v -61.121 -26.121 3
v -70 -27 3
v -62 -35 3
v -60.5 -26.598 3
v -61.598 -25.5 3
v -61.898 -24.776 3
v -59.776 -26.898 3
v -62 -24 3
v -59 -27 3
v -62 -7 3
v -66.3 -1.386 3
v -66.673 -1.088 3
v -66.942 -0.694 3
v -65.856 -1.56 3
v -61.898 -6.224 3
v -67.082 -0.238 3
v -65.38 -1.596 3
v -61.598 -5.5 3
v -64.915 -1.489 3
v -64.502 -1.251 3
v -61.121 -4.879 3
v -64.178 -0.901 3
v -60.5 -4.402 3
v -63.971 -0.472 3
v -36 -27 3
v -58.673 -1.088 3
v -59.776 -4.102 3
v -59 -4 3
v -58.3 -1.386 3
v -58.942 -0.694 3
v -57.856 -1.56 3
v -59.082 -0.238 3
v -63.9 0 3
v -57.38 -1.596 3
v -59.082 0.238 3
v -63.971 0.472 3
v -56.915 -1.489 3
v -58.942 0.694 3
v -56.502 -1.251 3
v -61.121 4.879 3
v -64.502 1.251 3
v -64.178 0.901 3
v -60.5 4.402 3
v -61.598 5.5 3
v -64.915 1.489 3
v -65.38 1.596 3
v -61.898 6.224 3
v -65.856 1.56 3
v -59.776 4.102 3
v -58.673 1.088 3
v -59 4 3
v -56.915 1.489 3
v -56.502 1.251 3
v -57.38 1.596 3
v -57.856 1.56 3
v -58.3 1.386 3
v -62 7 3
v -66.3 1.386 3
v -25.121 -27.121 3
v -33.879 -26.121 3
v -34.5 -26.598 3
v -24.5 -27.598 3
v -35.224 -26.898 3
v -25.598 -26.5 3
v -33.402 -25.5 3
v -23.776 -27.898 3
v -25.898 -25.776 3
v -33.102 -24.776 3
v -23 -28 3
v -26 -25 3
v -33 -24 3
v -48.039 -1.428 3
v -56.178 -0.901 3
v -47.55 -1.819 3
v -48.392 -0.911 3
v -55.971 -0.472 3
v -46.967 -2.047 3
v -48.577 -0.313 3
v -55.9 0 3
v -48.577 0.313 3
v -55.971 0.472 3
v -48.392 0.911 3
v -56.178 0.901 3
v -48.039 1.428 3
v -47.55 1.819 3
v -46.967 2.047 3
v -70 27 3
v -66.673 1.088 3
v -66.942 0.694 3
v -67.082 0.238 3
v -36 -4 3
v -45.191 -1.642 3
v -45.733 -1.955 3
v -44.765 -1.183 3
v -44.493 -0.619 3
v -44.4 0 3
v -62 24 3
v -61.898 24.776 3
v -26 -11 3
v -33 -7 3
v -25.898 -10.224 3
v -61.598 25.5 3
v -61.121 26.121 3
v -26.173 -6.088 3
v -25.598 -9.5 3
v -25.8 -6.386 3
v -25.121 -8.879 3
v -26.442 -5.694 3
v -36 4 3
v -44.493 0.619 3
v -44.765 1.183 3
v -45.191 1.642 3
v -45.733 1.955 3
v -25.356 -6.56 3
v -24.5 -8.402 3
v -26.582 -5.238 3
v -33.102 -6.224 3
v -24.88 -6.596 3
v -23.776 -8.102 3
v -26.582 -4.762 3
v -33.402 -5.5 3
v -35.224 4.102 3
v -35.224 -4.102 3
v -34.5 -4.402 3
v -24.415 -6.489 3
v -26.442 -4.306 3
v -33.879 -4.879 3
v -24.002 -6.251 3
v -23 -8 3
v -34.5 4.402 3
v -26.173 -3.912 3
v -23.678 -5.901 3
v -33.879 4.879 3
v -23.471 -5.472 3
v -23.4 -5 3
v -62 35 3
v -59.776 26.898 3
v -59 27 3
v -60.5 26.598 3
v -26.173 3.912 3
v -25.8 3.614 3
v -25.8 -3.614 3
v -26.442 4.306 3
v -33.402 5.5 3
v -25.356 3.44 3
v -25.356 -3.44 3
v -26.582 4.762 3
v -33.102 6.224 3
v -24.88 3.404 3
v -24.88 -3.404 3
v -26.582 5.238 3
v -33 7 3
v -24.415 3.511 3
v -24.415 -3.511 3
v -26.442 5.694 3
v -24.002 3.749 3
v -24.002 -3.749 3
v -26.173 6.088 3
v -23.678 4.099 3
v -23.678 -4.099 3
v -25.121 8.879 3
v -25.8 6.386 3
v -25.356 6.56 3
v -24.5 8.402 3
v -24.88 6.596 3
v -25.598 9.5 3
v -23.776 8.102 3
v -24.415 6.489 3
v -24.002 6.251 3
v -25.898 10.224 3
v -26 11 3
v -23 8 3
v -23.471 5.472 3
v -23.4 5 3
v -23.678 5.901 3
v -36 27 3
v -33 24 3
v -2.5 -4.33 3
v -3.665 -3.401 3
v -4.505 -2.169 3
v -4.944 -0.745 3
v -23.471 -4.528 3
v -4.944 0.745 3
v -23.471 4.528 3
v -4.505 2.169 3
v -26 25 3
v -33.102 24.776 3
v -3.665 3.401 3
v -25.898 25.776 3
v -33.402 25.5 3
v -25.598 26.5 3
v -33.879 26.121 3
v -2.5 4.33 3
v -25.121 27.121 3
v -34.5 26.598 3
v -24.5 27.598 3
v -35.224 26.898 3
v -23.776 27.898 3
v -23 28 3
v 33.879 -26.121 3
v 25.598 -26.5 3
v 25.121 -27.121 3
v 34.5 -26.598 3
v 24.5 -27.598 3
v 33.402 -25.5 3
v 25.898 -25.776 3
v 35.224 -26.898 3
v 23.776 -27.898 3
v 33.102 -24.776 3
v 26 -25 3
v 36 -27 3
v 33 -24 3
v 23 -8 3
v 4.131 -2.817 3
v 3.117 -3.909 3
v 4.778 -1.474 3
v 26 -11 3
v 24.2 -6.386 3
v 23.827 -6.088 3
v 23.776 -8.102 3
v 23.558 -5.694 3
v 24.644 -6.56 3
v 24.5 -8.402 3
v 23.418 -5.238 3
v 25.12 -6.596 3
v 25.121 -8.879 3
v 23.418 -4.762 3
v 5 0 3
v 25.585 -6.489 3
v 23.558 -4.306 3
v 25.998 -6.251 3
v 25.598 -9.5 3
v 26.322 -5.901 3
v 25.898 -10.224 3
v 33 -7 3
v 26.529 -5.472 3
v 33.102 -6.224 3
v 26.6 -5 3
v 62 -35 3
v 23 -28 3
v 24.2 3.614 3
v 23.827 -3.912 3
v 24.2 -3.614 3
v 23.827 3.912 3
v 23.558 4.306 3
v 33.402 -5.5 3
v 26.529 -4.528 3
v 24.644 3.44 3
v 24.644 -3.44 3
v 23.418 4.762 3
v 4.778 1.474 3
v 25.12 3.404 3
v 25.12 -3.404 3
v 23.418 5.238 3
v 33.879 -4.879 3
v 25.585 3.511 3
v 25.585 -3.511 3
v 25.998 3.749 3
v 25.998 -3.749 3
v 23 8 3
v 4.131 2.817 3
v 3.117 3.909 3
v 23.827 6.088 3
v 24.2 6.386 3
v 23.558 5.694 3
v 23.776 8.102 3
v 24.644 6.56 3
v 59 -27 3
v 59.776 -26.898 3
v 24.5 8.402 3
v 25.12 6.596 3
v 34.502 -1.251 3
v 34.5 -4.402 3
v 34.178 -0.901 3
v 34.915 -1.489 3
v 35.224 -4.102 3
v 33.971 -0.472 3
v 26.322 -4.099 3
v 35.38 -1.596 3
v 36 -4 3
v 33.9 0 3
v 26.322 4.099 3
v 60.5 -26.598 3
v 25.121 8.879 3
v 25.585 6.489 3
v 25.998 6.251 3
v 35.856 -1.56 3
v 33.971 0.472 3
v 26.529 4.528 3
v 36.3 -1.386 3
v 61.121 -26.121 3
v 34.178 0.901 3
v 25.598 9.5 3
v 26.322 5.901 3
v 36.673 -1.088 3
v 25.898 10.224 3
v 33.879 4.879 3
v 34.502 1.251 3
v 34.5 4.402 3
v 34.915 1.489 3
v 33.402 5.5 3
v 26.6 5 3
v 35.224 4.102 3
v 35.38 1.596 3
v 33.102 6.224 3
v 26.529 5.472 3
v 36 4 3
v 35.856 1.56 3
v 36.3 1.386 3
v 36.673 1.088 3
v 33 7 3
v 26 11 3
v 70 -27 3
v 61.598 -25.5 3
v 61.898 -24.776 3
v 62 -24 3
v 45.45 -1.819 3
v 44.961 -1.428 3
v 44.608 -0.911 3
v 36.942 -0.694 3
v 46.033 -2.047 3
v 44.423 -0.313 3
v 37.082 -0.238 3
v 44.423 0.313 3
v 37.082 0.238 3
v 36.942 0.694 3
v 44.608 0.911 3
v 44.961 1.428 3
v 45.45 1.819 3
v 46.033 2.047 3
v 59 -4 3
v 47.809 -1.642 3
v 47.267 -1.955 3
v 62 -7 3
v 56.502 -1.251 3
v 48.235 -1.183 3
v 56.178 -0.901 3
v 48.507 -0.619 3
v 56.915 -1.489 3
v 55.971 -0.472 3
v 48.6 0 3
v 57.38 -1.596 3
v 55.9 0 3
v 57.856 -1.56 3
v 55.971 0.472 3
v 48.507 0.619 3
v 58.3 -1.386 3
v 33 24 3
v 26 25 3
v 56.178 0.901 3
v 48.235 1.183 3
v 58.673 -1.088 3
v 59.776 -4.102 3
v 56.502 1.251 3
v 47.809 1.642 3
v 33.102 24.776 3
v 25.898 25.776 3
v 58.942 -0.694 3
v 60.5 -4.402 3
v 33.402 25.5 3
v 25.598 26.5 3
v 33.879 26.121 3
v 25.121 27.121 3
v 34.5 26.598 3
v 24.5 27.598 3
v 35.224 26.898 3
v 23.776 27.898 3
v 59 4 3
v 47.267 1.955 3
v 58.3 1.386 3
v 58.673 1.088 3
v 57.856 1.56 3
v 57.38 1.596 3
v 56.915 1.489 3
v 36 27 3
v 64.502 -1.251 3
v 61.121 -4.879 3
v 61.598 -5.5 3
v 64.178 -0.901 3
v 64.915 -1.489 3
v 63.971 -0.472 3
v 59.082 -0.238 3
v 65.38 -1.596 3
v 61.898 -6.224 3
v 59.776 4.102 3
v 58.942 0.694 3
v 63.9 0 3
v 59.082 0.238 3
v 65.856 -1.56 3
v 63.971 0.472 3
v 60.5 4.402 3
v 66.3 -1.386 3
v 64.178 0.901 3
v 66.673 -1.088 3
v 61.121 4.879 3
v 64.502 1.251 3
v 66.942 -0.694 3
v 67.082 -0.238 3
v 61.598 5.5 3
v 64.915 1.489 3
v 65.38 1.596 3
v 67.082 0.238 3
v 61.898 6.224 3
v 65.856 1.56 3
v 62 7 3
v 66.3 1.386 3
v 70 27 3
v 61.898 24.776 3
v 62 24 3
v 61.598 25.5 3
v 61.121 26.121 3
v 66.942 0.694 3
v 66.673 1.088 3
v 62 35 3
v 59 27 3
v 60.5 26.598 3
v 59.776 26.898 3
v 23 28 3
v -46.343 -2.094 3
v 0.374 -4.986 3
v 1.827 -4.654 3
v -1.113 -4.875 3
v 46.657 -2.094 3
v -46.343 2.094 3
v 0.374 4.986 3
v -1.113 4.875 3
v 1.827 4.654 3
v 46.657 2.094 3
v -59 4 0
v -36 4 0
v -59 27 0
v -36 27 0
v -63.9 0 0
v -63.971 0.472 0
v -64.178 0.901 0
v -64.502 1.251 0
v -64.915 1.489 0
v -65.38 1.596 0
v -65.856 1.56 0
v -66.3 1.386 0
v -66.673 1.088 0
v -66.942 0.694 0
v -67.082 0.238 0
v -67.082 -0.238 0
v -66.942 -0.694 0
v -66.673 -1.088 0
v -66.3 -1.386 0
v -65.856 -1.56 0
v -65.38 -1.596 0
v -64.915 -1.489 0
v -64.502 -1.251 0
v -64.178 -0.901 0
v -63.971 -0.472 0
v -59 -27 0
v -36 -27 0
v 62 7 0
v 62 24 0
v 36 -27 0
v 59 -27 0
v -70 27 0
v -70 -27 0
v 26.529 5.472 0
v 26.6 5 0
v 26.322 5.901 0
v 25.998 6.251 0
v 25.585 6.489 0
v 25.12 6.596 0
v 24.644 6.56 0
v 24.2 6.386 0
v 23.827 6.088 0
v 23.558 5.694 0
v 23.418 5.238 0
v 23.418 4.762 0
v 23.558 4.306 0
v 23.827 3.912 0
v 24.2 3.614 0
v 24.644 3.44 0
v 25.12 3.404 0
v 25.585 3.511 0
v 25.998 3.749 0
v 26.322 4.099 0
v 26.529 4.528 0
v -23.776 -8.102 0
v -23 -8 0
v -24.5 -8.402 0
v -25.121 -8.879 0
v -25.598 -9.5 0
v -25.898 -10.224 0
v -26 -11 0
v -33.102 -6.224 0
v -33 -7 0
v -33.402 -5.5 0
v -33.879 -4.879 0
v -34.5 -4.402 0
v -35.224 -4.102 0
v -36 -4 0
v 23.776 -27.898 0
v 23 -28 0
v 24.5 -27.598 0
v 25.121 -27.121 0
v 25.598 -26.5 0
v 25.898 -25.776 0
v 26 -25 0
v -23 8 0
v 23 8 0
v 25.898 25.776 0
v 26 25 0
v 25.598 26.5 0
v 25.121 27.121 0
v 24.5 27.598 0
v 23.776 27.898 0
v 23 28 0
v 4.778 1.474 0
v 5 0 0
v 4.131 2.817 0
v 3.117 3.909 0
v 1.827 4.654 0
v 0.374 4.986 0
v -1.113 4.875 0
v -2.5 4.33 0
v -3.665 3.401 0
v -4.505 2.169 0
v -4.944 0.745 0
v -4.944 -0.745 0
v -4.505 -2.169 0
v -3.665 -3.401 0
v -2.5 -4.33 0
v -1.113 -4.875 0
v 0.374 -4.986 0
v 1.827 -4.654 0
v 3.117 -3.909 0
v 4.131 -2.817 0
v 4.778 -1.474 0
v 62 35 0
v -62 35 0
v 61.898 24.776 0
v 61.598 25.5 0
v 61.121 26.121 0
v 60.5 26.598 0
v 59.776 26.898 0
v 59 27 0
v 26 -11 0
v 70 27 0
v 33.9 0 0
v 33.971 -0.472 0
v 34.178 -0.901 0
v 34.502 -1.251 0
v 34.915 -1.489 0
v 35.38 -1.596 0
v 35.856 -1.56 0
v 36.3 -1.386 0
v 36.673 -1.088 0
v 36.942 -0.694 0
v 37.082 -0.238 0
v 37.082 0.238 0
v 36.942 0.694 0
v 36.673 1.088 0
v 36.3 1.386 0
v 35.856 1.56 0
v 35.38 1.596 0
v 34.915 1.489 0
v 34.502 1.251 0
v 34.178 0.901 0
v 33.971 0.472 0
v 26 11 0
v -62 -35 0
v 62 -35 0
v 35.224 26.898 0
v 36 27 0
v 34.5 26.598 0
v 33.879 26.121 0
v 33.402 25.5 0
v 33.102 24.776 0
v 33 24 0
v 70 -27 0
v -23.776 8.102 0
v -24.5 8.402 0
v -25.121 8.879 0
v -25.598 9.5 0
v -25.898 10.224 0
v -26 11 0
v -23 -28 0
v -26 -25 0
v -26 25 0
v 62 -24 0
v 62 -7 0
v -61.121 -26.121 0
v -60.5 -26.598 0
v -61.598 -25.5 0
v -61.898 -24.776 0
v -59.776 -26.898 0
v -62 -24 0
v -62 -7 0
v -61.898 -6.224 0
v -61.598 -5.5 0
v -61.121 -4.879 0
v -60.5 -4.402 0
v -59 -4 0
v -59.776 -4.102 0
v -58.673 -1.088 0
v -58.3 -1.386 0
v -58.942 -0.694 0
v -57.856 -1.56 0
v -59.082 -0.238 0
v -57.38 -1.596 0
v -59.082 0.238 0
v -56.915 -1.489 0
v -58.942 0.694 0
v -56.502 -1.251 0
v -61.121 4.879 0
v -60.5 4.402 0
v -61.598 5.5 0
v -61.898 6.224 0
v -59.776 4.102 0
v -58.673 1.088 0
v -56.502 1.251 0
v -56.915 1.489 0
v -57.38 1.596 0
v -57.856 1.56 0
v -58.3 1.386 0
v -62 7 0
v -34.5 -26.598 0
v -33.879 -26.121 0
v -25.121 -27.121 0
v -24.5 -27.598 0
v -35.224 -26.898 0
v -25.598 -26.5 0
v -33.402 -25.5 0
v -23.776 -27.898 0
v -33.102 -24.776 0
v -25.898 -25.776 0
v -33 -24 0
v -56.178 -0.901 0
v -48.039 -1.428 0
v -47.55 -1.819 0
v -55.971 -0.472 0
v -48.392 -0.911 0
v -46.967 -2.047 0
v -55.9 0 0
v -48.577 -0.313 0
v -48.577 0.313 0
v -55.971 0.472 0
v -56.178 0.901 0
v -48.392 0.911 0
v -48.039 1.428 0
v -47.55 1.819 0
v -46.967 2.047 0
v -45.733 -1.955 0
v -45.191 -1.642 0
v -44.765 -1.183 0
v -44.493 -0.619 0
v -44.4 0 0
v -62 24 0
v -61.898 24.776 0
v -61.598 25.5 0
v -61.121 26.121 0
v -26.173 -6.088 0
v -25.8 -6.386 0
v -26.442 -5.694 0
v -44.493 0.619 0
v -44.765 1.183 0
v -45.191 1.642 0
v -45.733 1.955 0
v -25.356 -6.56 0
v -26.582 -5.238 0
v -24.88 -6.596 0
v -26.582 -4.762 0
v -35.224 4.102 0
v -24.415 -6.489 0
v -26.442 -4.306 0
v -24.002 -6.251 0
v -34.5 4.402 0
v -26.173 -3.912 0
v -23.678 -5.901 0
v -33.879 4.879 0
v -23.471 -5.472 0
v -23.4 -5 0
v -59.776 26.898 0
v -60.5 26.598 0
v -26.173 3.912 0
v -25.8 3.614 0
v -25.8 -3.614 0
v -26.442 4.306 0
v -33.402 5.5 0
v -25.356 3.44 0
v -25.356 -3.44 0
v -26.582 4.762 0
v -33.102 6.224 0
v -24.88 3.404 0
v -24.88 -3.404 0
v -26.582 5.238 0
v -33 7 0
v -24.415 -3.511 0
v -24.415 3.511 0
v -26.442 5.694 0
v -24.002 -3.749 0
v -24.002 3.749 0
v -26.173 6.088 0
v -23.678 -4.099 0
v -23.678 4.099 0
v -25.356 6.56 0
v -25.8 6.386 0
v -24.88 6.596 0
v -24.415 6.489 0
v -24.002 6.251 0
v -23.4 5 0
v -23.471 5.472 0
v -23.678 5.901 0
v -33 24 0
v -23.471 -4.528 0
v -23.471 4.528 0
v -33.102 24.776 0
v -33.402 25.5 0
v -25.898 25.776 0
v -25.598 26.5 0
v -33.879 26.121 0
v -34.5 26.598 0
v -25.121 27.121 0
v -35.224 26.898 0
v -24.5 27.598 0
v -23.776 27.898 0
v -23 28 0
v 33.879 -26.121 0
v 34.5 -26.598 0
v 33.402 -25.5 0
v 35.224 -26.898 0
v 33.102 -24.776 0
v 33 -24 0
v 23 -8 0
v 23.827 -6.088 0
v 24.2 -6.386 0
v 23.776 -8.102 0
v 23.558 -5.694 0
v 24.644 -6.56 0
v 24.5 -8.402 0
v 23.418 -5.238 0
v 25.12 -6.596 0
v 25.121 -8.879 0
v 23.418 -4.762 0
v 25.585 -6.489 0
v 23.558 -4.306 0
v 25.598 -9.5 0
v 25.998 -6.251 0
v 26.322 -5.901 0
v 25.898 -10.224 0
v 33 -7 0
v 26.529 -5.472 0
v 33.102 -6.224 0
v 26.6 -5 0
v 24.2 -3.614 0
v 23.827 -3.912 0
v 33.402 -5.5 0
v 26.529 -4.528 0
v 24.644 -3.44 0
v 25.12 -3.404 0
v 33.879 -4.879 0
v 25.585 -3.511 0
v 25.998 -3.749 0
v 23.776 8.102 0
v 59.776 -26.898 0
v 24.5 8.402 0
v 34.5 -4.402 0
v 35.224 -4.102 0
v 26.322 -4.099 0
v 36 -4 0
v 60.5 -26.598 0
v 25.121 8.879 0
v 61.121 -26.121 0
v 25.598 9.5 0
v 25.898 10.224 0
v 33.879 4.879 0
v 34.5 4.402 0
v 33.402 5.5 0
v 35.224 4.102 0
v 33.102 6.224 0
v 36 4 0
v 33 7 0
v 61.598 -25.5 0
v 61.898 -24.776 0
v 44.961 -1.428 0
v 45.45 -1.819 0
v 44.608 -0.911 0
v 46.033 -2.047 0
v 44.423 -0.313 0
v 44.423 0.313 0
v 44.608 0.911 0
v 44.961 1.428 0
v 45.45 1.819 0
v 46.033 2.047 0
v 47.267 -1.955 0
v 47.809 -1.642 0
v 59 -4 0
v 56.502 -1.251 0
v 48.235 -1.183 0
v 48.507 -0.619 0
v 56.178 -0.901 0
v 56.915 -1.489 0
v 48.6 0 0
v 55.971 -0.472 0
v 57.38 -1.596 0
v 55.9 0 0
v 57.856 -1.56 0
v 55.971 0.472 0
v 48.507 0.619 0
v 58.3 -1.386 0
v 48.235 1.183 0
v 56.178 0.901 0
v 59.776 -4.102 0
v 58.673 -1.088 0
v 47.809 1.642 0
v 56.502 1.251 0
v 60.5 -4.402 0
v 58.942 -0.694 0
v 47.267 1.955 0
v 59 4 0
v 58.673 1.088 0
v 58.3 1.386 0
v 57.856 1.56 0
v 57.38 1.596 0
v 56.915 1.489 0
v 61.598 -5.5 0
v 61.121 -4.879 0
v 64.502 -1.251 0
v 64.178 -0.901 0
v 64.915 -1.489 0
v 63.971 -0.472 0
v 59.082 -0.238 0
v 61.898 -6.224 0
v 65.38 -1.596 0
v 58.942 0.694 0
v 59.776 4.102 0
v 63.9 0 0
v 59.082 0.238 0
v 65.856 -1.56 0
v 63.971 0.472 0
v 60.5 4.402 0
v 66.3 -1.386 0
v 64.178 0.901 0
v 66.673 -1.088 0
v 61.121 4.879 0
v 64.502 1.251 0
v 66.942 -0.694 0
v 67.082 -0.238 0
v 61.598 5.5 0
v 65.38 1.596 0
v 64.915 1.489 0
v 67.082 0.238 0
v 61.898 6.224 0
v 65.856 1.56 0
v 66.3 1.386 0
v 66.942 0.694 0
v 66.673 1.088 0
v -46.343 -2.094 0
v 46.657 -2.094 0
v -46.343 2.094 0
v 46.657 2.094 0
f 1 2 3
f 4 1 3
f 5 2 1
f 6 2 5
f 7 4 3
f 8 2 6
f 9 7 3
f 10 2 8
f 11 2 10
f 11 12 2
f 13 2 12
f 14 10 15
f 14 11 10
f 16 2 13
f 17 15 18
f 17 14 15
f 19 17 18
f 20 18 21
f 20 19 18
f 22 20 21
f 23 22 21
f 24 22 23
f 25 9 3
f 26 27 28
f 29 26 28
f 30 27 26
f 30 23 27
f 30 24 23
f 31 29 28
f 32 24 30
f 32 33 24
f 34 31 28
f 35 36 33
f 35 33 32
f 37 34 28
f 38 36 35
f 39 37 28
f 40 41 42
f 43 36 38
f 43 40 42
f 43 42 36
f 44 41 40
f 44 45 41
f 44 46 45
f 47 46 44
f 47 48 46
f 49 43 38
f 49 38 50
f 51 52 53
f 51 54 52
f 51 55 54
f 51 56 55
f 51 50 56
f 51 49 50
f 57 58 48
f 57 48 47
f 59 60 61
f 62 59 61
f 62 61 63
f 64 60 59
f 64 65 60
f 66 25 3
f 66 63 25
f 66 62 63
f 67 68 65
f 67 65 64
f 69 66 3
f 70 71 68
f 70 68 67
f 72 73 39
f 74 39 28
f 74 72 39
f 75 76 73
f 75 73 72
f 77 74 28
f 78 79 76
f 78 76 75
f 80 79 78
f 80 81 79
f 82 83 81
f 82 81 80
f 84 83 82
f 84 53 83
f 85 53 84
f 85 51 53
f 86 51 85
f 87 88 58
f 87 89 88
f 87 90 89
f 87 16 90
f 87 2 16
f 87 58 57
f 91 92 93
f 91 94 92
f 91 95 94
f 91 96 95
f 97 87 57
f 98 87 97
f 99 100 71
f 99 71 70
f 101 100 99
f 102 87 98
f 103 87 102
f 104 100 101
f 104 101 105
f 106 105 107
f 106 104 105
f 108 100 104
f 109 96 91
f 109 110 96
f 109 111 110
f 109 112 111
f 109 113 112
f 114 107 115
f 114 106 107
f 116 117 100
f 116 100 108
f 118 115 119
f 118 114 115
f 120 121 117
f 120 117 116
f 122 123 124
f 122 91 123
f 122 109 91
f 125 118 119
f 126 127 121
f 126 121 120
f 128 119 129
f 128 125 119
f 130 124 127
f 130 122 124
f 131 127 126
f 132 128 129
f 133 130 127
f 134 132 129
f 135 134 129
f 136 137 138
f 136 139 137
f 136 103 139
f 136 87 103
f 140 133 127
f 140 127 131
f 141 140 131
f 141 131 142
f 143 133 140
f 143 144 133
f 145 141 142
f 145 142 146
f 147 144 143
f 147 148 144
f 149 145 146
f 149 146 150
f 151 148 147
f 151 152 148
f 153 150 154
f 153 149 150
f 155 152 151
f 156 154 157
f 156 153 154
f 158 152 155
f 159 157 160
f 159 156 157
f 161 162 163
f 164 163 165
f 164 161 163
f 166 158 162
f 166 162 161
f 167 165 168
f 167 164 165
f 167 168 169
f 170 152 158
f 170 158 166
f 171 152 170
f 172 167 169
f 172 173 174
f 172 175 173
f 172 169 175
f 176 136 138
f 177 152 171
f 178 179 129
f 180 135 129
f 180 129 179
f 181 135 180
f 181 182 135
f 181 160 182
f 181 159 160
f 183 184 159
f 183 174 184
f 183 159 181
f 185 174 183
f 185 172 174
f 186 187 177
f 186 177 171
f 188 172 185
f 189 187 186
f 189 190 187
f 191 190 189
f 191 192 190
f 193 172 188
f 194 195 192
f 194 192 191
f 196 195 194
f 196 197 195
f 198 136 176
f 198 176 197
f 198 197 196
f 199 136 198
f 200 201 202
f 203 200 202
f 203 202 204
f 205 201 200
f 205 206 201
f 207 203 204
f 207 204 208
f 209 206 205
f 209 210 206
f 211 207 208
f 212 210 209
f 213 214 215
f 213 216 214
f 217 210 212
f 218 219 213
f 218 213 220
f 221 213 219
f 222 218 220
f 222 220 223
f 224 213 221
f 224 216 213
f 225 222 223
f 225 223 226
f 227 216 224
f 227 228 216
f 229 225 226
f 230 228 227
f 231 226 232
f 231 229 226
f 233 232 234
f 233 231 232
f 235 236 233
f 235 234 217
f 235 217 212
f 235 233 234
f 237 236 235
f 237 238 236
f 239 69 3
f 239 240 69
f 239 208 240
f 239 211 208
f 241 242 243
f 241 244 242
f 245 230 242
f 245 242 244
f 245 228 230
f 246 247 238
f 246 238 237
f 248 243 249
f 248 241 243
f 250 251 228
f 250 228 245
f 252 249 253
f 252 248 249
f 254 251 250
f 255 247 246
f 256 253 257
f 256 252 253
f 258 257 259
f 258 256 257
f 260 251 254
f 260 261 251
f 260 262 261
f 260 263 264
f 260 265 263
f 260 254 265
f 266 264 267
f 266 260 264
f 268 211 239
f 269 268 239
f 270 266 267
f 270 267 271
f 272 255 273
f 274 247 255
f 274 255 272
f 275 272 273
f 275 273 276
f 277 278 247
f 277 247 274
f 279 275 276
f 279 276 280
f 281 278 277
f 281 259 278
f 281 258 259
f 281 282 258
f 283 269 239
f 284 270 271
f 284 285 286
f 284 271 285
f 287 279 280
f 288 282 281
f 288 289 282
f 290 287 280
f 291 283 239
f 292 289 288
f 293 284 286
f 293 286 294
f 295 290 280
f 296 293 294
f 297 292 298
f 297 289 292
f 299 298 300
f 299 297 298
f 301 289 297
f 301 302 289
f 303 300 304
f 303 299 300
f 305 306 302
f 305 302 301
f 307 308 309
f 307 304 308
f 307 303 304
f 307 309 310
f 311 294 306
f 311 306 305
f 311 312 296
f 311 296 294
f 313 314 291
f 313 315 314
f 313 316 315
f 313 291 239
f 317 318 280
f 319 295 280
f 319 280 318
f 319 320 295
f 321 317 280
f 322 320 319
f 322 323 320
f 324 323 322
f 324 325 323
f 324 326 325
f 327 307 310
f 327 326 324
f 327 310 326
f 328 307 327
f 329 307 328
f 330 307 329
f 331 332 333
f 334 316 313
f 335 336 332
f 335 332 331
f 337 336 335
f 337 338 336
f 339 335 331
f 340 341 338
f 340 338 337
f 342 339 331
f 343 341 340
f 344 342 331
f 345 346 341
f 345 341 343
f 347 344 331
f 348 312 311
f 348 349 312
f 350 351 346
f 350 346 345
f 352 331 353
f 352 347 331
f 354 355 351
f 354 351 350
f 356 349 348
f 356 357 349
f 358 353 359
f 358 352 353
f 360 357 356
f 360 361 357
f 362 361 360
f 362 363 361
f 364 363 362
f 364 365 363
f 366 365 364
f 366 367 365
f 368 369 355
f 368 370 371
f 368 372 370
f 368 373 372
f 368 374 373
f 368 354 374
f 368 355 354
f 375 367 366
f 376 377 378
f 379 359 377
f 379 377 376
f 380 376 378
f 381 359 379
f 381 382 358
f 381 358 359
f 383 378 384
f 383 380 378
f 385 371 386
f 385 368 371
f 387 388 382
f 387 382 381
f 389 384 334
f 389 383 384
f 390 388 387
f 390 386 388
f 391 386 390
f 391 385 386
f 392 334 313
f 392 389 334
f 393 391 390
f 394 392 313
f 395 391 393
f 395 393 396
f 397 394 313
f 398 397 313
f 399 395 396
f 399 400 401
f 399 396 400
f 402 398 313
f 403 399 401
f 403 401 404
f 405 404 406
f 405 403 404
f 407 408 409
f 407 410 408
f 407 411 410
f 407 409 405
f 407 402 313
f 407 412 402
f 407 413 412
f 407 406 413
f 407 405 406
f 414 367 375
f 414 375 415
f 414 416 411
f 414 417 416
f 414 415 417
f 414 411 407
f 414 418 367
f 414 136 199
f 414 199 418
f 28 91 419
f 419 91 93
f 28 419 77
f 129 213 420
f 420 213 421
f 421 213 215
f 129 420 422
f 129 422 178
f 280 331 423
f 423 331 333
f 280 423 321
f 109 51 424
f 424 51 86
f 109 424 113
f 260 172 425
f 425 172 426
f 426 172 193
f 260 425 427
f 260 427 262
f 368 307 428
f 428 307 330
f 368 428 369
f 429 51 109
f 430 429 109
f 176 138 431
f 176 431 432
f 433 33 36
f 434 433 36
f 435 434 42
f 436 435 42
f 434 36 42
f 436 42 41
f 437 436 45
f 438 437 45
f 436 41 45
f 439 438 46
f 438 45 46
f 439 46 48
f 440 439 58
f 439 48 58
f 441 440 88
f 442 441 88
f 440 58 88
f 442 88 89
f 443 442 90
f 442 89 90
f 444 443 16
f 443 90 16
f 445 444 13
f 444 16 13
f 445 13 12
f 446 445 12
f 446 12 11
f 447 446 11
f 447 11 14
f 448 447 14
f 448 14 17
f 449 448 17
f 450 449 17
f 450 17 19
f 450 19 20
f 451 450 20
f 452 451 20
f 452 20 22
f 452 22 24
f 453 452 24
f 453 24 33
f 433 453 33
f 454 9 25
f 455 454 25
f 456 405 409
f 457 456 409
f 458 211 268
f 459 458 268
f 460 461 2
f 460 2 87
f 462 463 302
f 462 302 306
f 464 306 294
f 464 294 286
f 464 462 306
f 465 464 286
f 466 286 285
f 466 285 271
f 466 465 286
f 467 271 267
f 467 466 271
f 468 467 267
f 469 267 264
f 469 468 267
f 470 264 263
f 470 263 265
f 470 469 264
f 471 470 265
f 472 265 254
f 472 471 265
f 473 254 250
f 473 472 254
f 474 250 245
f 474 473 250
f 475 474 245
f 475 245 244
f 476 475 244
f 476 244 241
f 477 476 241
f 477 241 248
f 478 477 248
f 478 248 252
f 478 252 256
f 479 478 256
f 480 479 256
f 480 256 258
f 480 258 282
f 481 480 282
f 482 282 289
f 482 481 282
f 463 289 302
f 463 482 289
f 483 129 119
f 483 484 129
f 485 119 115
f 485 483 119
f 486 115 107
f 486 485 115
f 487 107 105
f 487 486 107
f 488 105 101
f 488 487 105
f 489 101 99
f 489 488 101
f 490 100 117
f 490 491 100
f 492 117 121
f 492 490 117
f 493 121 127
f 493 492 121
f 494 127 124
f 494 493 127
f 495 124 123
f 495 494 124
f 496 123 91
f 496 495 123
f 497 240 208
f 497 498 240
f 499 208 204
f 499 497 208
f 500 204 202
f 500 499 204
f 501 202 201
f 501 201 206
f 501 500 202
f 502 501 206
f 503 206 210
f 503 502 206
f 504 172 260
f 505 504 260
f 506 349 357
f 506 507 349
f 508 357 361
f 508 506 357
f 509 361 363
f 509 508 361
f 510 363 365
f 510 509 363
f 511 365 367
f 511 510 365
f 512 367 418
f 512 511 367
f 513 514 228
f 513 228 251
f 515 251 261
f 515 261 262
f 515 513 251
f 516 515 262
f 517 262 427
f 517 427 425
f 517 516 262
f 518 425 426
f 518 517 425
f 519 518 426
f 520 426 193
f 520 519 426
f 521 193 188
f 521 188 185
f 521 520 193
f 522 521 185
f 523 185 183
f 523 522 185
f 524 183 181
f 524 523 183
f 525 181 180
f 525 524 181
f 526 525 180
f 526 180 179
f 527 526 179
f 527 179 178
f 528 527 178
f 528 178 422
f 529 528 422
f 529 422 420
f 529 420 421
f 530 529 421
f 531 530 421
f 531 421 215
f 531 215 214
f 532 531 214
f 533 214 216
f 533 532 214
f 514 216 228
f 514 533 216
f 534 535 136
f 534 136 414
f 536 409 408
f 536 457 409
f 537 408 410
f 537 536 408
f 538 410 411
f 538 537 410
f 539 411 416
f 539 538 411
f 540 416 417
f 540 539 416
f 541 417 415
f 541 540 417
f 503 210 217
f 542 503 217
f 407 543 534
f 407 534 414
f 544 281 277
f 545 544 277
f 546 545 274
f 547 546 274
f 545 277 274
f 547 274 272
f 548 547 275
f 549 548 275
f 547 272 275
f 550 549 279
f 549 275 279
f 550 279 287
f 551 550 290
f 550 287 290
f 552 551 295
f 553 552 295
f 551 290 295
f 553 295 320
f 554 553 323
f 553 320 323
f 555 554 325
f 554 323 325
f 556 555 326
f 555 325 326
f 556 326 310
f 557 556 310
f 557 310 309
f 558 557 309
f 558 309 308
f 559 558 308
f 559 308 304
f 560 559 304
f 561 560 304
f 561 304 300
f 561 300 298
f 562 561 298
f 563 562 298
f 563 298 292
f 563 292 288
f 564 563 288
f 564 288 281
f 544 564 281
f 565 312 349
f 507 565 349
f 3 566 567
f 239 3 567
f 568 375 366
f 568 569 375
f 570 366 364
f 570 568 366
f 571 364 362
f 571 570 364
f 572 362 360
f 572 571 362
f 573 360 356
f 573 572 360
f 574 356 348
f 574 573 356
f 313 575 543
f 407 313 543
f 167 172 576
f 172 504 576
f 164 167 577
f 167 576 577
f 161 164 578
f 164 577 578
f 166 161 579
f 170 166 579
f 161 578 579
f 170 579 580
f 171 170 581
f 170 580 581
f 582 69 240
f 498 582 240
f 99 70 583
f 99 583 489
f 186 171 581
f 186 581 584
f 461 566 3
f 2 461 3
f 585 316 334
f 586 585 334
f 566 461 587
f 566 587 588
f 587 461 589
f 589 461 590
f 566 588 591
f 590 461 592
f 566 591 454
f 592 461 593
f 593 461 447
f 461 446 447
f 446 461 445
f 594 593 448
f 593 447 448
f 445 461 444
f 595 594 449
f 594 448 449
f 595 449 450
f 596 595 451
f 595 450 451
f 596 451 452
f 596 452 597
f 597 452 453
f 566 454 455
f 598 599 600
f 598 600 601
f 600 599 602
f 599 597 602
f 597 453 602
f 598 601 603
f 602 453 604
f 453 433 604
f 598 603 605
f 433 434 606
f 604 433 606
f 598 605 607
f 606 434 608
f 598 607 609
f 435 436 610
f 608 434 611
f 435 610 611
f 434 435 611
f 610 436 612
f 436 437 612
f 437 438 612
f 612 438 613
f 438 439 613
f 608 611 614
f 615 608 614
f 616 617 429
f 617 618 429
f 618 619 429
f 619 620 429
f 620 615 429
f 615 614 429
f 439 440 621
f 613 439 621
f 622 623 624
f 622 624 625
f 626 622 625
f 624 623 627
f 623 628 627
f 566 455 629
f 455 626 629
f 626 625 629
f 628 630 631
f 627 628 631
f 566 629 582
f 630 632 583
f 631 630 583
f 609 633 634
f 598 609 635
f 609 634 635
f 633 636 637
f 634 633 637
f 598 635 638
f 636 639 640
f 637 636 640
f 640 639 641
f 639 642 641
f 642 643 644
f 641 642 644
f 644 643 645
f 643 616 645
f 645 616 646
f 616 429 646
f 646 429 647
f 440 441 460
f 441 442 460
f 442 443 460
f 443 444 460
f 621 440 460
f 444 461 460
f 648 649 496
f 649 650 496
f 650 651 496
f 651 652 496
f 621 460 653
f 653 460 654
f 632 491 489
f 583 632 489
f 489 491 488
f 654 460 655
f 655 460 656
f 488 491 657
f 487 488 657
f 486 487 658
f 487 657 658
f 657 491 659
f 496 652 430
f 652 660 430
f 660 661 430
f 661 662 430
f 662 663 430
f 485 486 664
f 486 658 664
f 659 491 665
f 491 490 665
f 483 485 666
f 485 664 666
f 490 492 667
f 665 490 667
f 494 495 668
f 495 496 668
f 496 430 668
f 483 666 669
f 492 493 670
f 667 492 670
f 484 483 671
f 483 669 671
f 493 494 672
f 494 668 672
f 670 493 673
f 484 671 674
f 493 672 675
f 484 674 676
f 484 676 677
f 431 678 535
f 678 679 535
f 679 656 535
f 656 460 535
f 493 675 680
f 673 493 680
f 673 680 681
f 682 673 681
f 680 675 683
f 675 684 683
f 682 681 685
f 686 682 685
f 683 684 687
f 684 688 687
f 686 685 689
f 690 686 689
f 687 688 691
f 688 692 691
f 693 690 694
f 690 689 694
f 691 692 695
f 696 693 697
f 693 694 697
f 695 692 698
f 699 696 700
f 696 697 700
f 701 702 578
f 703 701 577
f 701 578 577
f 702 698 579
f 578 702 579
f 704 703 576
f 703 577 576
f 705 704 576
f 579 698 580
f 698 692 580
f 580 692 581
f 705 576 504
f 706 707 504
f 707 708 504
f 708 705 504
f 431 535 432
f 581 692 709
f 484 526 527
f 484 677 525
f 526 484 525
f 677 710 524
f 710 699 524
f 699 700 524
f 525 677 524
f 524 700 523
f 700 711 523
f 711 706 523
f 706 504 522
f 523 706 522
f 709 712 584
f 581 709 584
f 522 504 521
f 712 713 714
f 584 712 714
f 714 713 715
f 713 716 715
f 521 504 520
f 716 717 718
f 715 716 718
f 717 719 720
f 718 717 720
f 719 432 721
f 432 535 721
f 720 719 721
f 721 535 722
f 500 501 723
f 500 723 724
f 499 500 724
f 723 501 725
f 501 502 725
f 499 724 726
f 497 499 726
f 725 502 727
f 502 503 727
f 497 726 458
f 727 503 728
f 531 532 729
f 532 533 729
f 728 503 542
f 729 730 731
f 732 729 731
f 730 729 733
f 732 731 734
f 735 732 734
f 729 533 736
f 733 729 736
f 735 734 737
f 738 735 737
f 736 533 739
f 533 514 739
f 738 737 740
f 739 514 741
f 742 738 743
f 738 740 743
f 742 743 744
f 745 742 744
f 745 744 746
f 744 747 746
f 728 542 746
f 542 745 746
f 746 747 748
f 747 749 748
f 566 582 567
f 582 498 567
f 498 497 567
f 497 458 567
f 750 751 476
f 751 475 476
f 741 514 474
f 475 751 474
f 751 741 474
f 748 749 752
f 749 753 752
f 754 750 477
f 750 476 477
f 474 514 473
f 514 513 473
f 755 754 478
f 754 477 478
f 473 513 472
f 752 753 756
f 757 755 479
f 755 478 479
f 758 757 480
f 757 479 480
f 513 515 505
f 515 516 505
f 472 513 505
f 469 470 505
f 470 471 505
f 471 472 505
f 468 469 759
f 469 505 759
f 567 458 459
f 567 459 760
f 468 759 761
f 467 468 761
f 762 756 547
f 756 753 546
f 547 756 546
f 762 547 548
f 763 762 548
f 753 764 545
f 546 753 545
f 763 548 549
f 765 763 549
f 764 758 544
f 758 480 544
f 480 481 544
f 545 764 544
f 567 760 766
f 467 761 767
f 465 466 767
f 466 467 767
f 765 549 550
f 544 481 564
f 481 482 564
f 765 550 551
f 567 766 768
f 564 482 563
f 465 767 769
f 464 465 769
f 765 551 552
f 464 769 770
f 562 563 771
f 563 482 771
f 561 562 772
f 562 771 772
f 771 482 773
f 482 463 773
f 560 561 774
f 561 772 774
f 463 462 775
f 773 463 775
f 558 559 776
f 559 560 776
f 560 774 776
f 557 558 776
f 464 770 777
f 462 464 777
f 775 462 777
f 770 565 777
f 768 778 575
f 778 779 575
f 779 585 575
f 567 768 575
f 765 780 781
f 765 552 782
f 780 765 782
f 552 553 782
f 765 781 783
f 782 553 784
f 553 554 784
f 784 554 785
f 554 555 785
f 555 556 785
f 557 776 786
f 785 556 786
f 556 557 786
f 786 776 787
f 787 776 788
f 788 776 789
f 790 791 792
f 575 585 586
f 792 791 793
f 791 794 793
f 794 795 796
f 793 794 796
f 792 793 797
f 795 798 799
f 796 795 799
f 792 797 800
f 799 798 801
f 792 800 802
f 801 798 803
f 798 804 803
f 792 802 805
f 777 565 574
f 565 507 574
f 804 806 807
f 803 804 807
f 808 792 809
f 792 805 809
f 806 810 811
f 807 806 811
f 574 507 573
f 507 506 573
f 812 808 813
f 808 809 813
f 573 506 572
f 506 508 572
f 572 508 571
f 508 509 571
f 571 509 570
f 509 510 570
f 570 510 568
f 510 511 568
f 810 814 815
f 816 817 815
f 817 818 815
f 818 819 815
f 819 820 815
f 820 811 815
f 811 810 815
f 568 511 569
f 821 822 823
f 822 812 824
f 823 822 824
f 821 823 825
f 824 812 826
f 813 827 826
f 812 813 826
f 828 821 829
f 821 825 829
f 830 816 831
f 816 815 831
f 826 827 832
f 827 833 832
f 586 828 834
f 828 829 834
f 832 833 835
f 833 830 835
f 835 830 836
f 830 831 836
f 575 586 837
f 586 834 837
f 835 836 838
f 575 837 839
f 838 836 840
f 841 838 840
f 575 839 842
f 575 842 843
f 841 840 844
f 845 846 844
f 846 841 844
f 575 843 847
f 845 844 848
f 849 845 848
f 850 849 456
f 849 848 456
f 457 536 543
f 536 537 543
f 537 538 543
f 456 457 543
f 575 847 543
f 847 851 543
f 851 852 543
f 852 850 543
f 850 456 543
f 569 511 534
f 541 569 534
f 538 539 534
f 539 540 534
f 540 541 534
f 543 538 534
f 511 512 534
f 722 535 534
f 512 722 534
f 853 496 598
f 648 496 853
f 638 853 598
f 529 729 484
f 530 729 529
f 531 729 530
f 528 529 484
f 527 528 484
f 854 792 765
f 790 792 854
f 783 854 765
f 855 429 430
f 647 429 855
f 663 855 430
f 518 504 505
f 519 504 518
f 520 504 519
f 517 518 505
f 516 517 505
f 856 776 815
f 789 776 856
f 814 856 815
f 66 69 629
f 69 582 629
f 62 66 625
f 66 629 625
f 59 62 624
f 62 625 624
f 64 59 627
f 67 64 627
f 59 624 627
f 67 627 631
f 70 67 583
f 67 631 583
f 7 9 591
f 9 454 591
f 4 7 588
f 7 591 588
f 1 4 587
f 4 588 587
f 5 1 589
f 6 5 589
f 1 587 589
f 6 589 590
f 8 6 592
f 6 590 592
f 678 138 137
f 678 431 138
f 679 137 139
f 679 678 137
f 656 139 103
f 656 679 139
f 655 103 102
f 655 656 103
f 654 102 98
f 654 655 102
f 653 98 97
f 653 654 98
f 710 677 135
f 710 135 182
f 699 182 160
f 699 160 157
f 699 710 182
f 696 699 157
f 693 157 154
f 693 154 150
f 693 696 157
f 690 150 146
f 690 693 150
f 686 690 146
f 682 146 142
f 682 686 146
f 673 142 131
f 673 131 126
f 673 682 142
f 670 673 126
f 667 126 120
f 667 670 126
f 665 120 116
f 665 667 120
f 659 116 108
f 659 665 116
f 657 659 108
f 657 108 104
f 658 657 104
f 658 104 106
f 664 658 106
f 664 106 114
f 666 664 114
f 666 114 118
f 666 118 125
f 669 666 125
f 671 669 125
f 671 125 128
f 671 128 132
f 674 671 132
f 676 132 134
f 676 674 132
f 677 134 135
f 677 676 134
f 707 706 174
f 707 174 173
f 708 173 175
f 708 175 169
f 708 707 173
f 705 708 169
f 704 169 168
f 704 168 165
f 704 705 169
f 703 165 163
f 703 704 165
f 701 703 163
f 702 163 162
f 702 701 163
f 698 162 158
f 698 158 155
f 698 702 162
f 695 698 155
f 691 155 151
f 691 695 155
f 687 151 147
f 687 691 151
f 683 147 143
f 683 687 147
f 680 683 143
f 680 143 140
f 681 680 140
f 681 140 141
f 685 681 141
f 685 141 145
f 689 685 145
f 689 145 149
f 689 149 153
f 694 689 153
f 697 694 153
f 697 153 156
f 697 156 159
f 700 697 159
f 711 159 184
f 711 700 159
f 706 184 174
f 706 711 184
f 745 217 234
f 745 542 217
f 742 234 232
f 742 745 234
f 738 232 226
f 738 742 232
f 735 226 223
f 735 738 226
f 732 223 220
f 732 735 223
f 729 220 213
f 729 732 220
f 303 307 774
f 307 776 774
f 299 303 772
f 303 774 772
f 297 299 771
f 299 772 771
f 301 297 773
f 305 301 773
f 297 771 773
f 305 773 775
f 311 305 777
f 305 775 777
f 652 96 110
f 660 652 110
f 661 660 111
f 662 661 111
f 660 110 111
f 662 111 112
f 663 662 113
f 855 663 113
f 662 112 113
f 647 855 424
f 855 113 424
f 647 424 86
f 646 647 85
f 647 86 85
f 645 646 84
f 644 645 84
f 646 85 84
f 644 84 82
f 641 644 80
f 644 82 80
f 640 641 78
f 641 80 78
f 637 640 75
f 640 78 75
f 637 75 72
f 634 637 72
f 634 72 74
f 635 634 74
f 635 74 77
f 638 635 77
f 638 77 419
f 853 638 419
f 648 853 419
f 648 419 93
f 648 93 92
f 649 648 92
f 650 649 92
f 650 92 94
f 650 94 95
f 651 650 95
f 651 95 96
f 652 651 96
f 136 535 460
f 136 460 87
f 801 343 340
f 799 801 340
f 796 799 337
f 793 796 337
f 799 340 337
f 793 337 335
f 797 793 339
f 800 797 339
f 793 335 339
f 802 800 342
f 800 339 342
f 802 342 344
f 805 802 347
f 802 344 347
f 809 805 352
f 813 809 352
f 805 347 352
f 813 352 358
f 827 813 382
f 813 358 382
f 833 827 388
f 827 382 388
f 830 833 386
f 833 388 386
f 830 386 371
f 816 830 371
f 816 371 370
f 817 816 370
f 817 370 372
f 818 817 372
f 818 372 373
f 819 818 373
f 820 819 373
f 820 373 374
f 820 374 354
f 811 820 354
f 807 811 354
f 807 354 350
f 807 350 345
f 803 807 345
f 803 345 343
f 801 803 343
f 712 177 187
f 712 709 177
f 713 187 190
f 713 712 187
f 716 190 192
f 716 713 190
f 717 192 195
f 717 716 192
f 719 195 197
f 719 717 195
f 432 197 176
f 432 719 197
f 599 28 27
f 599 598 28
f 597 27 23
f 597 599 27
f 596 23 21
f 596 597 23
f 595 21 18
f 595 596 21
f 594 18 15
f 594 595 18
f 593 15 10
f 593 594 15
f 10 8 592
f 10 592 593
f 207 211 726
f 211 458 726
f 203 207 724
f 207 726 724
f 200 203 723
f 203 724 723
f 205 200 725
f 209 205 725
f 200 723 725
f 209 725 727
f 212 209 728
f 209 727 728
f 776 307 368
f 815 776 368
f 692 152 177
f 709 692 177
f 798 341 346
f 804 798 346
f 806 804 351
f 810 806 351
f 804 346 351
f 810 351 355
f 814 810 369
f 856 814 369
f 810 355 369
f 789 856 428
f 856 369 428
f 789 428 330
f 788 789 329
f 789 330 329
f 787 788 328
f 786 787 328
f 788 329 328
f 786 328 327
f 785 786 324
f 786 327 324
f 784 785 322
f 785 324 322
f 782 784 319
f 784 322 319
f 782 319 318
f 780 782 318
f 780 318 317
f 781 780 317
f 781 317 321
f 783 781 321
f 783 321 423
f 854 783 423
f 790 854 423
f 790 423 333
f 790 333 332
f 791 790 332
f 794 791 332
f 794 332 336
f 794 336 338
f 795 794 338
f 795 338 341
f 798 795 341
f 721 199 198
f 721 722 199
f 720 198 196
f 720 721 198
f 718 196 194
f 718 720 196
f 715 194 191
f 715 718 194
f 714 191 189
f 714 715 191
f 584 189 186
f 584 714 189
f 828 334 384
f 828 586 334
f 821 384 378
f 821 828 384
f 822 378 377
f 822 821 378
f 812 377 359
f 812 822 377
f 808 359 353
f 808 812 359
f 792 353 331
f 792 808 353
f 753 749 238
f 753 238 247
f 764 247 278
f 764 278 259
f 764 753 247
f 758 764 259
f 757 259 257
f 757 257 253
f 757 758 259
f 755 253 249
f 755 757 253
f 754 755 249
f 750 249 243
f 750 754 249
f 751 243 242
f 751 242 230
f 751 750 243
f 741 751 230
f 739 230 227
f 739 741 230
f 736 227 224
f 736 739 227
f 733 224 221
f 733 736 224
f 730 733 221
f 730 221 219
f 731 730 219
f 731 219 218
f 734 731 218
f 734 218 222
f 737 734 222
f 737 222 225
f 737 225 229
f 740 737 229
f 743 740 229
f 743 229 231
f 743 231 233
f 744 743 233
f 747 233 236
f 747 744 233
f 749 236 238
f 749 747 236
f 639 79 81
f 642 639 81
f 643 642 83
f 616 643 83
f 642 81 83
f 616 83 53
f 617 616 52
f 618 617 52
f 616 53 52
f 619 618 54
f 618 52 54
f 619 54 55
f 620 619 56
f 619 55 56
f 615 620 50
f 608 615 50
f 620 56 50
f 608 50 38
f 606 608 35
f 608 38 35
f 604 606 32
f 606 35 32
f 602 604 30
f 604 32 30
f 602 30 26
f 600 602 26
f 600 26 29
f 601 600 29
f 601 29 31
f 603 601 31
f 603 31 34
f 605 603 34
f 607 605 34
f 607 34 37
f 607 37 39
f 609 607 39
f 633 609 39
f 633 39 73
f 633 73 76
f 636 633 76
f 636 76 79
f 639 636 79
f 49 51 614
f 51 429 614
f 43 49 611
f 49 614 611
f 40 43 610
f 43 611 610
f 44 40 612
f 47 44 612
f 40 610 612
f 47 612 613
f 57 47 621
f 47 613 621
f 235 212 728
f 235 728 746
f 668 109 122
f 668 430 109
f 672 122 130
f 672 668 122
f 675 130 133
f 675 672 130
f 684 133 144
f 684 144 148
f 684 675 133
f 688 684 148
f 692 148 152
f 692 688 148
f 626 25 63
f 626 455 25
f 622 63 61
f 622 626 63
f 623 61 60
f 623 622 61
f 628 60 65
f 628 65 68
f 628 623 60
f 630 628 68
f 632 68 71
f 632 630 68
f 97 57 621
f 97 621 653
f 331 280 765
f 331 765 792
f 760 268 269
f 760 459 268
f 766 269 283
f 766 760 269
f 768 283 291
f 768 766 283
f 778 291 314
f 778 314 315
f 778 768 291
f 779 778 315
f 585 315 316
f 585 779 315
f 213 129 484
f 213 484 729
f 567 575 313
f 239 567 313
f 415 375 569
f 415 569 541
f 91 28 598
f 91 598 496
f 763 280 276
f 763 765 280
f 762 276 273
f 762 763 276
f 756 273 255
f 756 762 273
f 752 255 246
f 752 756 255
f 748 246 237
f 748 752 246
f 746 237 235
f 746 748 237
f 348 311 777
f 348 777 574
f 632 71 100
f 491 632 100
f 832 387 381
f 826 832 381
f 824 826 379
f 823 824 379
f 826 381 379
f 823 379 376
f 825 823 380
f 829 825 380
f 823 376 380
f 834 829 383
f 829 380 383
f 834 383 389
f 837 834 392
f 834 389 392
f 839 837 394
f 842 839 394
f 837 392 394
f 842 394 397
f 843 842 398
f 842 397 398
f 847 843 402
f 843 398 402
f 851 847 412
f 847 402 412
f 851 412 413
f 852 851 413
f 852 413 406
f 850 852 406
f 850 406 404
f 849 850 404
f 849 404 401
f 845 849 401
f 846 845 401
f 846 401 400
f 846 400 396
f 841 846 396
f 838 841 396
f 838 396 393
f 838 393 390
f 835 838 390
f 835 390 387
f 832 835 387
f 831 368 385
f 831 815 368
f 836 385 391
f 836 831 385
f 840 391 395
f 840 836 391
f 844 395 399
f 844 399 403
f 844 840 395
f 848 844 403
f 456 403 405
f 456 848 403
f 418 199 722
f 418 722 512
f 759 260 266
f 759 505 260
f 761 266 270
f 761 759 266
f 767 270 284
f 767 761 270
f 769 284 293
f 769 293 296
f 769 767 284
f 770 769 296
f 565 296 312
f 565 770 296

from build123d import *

# Parameters (mm, degrees)
SKETCH_1_W          = 140
SKETCH_1_H          = 70
SKETCH_1_R          = 1.6
SKETCH_1_R_2        = 5
EXTRUDE_1_DEPTH     = 3
SKETCH_2_W          = 29
SKETCH_2_H          = 23
SKETCH_2_W_2        = 52
SKETCH_2_H_2        = 20
CUT_EXTRUDE_1_DEPTH = 79.319856997
FILLET_1_R          = 3
CHAMFER_1_SIZE      = 8
SKETCH_3_R          = 2.1
SKETCH_3_R_2        = 1.6
CUT_EXTRUDE_2_DEPTH = 79.319856997


with BuildPart() as part:
    # 草图1 → 凸台-拉伸1 (new body)
    with BuildSketch(Plane.XY):
        Rectangle(SKETCH_1_W, SKETCH_1_H)
        with Locations((-25, 5)):
            Circle(SKETCH_1_R, mode=Mode.SUBTRACT)
        with Locations((25, 5)):
            Circle(SKETCH_1_R, mode=Mode.SUBTRACT)
        with Locations((-25, -5)):
            Circle(SKETCH_1_R, mode=Mode.SUBTRACT)
        with Locations((25, -5)):
            Circle(SKETCH_1_R, mode=Mode.SUBTRACT)
        Circle(SKETCH_1_R_2, mode=Mode.SUBTRACT)
    extrude(amount=EXTRUDE_1_DEPTH)

    # 草图2 → 切除-拉伸1 (cut, through all)
    with BuildSketch(Plane.XY.offset(3)):
        with Locations((-47.5, 15.5)):
            Rectangle(SKETCH_2_W, SKETCH_2_H)
        with Locations((-47.5, -15.5)):
            Rectangle(SKETCH_2_W, SKETCH_2_H)
        with Locations((47.5, -15.5)):
            Rectangle(SKETCH_2_W, SKETCH_2_H)
        with Locations((47.5, 15.5)):
            Rectangle(SKETCH_2_W, SKETCH_2_H)
        with Locations((0, 18)):
            Rectangle(SKETCH_2_W_2, SKETCH_2_H_2)
        with Locations((0, -18)):
            Rectangle(SKETCH_2_W_2, SKETCH_2_H_2)
    extrude(amount=-CUT_EXTRUDE_1_DEPTH, mode=Mode.SUBTRACT)

    # 圆角1
    fillet_1_edges = [part.edges().sort_by_distance(p)[0] for p in [
        (-62, -27, 1.5),
        (-62, -4, 1.5),
        (-33, -4, 1.5),
        (-33, -27, 1.5),
        (26, 28, 1.5),
        (26, 8, 1.5),
        (-26, 8, 1.5),
        (-26, 28, 1.5),
        (62, -4, 1.5),
        (62, -27, 1.5),
        (33, -27, 1.5),
        (33, -4, 1.5),
        (62, 27, 1.5),
        (62, 4, 1.5),
        (33, 4, 1.5),
        (33, 27, 1.5),
        (26, -8, 1.5),
        (26, -28, 1.5),
        (-26, -28, 1.5),
        (-26, -8, 1.5),
        (-62, 4, 1.5),
        (-62, 27, 1.5),
        (-33, 27, 1.5),
        (-33, 4, 1.5),
    ]]
    fillet(fillet_1_edges, radius=FILLET_1_R)

    # 倒角1
    chamfer_1_edges = [part.edges().sort_by_distance(p)[0] for p in [
        (-70, 35, 1.5),
        (70, 35, 1.5),
        (70, -35, 1.5),
        (-70, -35, 1.5),
    ]]
    chamfer(chamfer_1_edges, length=CHAMFER_1_SIZE)

    # 草图3 → 切除-拉伸2 (cut, through all)
    with BuildSketch(Plane.XY.offset(3)):
        with Locations((-46.5, 0)):
            Circle(SKETCH_3_R)
        with Locations((46.5, 0)):
            Circle(SKETCH_3_R)
        with Locations((-57.5, 0)):
            Circle(SKETCH_3_R_2)
        with Locations(Location((57.5, 0, 0), (0, 0, 180))):
            Circle(SKETCH_3_R_2)
        with Locations(Location((35.5, 0, 0), (0, 0, 180))):
            Circle(SKETCH_3_R_2)
        with Locations((-65.5, 0)):
            Circle(SKETCH_3_R_2)
        with Locations(Location((65.5, 0, 0), (0, 0, 180))):
            Circle(SKETCH_3_R_2)
    extrude(amount=-CUT_EXTRUDE_2_DEPTH, mode=Mode.SUBTRACT)


solid = part.part
